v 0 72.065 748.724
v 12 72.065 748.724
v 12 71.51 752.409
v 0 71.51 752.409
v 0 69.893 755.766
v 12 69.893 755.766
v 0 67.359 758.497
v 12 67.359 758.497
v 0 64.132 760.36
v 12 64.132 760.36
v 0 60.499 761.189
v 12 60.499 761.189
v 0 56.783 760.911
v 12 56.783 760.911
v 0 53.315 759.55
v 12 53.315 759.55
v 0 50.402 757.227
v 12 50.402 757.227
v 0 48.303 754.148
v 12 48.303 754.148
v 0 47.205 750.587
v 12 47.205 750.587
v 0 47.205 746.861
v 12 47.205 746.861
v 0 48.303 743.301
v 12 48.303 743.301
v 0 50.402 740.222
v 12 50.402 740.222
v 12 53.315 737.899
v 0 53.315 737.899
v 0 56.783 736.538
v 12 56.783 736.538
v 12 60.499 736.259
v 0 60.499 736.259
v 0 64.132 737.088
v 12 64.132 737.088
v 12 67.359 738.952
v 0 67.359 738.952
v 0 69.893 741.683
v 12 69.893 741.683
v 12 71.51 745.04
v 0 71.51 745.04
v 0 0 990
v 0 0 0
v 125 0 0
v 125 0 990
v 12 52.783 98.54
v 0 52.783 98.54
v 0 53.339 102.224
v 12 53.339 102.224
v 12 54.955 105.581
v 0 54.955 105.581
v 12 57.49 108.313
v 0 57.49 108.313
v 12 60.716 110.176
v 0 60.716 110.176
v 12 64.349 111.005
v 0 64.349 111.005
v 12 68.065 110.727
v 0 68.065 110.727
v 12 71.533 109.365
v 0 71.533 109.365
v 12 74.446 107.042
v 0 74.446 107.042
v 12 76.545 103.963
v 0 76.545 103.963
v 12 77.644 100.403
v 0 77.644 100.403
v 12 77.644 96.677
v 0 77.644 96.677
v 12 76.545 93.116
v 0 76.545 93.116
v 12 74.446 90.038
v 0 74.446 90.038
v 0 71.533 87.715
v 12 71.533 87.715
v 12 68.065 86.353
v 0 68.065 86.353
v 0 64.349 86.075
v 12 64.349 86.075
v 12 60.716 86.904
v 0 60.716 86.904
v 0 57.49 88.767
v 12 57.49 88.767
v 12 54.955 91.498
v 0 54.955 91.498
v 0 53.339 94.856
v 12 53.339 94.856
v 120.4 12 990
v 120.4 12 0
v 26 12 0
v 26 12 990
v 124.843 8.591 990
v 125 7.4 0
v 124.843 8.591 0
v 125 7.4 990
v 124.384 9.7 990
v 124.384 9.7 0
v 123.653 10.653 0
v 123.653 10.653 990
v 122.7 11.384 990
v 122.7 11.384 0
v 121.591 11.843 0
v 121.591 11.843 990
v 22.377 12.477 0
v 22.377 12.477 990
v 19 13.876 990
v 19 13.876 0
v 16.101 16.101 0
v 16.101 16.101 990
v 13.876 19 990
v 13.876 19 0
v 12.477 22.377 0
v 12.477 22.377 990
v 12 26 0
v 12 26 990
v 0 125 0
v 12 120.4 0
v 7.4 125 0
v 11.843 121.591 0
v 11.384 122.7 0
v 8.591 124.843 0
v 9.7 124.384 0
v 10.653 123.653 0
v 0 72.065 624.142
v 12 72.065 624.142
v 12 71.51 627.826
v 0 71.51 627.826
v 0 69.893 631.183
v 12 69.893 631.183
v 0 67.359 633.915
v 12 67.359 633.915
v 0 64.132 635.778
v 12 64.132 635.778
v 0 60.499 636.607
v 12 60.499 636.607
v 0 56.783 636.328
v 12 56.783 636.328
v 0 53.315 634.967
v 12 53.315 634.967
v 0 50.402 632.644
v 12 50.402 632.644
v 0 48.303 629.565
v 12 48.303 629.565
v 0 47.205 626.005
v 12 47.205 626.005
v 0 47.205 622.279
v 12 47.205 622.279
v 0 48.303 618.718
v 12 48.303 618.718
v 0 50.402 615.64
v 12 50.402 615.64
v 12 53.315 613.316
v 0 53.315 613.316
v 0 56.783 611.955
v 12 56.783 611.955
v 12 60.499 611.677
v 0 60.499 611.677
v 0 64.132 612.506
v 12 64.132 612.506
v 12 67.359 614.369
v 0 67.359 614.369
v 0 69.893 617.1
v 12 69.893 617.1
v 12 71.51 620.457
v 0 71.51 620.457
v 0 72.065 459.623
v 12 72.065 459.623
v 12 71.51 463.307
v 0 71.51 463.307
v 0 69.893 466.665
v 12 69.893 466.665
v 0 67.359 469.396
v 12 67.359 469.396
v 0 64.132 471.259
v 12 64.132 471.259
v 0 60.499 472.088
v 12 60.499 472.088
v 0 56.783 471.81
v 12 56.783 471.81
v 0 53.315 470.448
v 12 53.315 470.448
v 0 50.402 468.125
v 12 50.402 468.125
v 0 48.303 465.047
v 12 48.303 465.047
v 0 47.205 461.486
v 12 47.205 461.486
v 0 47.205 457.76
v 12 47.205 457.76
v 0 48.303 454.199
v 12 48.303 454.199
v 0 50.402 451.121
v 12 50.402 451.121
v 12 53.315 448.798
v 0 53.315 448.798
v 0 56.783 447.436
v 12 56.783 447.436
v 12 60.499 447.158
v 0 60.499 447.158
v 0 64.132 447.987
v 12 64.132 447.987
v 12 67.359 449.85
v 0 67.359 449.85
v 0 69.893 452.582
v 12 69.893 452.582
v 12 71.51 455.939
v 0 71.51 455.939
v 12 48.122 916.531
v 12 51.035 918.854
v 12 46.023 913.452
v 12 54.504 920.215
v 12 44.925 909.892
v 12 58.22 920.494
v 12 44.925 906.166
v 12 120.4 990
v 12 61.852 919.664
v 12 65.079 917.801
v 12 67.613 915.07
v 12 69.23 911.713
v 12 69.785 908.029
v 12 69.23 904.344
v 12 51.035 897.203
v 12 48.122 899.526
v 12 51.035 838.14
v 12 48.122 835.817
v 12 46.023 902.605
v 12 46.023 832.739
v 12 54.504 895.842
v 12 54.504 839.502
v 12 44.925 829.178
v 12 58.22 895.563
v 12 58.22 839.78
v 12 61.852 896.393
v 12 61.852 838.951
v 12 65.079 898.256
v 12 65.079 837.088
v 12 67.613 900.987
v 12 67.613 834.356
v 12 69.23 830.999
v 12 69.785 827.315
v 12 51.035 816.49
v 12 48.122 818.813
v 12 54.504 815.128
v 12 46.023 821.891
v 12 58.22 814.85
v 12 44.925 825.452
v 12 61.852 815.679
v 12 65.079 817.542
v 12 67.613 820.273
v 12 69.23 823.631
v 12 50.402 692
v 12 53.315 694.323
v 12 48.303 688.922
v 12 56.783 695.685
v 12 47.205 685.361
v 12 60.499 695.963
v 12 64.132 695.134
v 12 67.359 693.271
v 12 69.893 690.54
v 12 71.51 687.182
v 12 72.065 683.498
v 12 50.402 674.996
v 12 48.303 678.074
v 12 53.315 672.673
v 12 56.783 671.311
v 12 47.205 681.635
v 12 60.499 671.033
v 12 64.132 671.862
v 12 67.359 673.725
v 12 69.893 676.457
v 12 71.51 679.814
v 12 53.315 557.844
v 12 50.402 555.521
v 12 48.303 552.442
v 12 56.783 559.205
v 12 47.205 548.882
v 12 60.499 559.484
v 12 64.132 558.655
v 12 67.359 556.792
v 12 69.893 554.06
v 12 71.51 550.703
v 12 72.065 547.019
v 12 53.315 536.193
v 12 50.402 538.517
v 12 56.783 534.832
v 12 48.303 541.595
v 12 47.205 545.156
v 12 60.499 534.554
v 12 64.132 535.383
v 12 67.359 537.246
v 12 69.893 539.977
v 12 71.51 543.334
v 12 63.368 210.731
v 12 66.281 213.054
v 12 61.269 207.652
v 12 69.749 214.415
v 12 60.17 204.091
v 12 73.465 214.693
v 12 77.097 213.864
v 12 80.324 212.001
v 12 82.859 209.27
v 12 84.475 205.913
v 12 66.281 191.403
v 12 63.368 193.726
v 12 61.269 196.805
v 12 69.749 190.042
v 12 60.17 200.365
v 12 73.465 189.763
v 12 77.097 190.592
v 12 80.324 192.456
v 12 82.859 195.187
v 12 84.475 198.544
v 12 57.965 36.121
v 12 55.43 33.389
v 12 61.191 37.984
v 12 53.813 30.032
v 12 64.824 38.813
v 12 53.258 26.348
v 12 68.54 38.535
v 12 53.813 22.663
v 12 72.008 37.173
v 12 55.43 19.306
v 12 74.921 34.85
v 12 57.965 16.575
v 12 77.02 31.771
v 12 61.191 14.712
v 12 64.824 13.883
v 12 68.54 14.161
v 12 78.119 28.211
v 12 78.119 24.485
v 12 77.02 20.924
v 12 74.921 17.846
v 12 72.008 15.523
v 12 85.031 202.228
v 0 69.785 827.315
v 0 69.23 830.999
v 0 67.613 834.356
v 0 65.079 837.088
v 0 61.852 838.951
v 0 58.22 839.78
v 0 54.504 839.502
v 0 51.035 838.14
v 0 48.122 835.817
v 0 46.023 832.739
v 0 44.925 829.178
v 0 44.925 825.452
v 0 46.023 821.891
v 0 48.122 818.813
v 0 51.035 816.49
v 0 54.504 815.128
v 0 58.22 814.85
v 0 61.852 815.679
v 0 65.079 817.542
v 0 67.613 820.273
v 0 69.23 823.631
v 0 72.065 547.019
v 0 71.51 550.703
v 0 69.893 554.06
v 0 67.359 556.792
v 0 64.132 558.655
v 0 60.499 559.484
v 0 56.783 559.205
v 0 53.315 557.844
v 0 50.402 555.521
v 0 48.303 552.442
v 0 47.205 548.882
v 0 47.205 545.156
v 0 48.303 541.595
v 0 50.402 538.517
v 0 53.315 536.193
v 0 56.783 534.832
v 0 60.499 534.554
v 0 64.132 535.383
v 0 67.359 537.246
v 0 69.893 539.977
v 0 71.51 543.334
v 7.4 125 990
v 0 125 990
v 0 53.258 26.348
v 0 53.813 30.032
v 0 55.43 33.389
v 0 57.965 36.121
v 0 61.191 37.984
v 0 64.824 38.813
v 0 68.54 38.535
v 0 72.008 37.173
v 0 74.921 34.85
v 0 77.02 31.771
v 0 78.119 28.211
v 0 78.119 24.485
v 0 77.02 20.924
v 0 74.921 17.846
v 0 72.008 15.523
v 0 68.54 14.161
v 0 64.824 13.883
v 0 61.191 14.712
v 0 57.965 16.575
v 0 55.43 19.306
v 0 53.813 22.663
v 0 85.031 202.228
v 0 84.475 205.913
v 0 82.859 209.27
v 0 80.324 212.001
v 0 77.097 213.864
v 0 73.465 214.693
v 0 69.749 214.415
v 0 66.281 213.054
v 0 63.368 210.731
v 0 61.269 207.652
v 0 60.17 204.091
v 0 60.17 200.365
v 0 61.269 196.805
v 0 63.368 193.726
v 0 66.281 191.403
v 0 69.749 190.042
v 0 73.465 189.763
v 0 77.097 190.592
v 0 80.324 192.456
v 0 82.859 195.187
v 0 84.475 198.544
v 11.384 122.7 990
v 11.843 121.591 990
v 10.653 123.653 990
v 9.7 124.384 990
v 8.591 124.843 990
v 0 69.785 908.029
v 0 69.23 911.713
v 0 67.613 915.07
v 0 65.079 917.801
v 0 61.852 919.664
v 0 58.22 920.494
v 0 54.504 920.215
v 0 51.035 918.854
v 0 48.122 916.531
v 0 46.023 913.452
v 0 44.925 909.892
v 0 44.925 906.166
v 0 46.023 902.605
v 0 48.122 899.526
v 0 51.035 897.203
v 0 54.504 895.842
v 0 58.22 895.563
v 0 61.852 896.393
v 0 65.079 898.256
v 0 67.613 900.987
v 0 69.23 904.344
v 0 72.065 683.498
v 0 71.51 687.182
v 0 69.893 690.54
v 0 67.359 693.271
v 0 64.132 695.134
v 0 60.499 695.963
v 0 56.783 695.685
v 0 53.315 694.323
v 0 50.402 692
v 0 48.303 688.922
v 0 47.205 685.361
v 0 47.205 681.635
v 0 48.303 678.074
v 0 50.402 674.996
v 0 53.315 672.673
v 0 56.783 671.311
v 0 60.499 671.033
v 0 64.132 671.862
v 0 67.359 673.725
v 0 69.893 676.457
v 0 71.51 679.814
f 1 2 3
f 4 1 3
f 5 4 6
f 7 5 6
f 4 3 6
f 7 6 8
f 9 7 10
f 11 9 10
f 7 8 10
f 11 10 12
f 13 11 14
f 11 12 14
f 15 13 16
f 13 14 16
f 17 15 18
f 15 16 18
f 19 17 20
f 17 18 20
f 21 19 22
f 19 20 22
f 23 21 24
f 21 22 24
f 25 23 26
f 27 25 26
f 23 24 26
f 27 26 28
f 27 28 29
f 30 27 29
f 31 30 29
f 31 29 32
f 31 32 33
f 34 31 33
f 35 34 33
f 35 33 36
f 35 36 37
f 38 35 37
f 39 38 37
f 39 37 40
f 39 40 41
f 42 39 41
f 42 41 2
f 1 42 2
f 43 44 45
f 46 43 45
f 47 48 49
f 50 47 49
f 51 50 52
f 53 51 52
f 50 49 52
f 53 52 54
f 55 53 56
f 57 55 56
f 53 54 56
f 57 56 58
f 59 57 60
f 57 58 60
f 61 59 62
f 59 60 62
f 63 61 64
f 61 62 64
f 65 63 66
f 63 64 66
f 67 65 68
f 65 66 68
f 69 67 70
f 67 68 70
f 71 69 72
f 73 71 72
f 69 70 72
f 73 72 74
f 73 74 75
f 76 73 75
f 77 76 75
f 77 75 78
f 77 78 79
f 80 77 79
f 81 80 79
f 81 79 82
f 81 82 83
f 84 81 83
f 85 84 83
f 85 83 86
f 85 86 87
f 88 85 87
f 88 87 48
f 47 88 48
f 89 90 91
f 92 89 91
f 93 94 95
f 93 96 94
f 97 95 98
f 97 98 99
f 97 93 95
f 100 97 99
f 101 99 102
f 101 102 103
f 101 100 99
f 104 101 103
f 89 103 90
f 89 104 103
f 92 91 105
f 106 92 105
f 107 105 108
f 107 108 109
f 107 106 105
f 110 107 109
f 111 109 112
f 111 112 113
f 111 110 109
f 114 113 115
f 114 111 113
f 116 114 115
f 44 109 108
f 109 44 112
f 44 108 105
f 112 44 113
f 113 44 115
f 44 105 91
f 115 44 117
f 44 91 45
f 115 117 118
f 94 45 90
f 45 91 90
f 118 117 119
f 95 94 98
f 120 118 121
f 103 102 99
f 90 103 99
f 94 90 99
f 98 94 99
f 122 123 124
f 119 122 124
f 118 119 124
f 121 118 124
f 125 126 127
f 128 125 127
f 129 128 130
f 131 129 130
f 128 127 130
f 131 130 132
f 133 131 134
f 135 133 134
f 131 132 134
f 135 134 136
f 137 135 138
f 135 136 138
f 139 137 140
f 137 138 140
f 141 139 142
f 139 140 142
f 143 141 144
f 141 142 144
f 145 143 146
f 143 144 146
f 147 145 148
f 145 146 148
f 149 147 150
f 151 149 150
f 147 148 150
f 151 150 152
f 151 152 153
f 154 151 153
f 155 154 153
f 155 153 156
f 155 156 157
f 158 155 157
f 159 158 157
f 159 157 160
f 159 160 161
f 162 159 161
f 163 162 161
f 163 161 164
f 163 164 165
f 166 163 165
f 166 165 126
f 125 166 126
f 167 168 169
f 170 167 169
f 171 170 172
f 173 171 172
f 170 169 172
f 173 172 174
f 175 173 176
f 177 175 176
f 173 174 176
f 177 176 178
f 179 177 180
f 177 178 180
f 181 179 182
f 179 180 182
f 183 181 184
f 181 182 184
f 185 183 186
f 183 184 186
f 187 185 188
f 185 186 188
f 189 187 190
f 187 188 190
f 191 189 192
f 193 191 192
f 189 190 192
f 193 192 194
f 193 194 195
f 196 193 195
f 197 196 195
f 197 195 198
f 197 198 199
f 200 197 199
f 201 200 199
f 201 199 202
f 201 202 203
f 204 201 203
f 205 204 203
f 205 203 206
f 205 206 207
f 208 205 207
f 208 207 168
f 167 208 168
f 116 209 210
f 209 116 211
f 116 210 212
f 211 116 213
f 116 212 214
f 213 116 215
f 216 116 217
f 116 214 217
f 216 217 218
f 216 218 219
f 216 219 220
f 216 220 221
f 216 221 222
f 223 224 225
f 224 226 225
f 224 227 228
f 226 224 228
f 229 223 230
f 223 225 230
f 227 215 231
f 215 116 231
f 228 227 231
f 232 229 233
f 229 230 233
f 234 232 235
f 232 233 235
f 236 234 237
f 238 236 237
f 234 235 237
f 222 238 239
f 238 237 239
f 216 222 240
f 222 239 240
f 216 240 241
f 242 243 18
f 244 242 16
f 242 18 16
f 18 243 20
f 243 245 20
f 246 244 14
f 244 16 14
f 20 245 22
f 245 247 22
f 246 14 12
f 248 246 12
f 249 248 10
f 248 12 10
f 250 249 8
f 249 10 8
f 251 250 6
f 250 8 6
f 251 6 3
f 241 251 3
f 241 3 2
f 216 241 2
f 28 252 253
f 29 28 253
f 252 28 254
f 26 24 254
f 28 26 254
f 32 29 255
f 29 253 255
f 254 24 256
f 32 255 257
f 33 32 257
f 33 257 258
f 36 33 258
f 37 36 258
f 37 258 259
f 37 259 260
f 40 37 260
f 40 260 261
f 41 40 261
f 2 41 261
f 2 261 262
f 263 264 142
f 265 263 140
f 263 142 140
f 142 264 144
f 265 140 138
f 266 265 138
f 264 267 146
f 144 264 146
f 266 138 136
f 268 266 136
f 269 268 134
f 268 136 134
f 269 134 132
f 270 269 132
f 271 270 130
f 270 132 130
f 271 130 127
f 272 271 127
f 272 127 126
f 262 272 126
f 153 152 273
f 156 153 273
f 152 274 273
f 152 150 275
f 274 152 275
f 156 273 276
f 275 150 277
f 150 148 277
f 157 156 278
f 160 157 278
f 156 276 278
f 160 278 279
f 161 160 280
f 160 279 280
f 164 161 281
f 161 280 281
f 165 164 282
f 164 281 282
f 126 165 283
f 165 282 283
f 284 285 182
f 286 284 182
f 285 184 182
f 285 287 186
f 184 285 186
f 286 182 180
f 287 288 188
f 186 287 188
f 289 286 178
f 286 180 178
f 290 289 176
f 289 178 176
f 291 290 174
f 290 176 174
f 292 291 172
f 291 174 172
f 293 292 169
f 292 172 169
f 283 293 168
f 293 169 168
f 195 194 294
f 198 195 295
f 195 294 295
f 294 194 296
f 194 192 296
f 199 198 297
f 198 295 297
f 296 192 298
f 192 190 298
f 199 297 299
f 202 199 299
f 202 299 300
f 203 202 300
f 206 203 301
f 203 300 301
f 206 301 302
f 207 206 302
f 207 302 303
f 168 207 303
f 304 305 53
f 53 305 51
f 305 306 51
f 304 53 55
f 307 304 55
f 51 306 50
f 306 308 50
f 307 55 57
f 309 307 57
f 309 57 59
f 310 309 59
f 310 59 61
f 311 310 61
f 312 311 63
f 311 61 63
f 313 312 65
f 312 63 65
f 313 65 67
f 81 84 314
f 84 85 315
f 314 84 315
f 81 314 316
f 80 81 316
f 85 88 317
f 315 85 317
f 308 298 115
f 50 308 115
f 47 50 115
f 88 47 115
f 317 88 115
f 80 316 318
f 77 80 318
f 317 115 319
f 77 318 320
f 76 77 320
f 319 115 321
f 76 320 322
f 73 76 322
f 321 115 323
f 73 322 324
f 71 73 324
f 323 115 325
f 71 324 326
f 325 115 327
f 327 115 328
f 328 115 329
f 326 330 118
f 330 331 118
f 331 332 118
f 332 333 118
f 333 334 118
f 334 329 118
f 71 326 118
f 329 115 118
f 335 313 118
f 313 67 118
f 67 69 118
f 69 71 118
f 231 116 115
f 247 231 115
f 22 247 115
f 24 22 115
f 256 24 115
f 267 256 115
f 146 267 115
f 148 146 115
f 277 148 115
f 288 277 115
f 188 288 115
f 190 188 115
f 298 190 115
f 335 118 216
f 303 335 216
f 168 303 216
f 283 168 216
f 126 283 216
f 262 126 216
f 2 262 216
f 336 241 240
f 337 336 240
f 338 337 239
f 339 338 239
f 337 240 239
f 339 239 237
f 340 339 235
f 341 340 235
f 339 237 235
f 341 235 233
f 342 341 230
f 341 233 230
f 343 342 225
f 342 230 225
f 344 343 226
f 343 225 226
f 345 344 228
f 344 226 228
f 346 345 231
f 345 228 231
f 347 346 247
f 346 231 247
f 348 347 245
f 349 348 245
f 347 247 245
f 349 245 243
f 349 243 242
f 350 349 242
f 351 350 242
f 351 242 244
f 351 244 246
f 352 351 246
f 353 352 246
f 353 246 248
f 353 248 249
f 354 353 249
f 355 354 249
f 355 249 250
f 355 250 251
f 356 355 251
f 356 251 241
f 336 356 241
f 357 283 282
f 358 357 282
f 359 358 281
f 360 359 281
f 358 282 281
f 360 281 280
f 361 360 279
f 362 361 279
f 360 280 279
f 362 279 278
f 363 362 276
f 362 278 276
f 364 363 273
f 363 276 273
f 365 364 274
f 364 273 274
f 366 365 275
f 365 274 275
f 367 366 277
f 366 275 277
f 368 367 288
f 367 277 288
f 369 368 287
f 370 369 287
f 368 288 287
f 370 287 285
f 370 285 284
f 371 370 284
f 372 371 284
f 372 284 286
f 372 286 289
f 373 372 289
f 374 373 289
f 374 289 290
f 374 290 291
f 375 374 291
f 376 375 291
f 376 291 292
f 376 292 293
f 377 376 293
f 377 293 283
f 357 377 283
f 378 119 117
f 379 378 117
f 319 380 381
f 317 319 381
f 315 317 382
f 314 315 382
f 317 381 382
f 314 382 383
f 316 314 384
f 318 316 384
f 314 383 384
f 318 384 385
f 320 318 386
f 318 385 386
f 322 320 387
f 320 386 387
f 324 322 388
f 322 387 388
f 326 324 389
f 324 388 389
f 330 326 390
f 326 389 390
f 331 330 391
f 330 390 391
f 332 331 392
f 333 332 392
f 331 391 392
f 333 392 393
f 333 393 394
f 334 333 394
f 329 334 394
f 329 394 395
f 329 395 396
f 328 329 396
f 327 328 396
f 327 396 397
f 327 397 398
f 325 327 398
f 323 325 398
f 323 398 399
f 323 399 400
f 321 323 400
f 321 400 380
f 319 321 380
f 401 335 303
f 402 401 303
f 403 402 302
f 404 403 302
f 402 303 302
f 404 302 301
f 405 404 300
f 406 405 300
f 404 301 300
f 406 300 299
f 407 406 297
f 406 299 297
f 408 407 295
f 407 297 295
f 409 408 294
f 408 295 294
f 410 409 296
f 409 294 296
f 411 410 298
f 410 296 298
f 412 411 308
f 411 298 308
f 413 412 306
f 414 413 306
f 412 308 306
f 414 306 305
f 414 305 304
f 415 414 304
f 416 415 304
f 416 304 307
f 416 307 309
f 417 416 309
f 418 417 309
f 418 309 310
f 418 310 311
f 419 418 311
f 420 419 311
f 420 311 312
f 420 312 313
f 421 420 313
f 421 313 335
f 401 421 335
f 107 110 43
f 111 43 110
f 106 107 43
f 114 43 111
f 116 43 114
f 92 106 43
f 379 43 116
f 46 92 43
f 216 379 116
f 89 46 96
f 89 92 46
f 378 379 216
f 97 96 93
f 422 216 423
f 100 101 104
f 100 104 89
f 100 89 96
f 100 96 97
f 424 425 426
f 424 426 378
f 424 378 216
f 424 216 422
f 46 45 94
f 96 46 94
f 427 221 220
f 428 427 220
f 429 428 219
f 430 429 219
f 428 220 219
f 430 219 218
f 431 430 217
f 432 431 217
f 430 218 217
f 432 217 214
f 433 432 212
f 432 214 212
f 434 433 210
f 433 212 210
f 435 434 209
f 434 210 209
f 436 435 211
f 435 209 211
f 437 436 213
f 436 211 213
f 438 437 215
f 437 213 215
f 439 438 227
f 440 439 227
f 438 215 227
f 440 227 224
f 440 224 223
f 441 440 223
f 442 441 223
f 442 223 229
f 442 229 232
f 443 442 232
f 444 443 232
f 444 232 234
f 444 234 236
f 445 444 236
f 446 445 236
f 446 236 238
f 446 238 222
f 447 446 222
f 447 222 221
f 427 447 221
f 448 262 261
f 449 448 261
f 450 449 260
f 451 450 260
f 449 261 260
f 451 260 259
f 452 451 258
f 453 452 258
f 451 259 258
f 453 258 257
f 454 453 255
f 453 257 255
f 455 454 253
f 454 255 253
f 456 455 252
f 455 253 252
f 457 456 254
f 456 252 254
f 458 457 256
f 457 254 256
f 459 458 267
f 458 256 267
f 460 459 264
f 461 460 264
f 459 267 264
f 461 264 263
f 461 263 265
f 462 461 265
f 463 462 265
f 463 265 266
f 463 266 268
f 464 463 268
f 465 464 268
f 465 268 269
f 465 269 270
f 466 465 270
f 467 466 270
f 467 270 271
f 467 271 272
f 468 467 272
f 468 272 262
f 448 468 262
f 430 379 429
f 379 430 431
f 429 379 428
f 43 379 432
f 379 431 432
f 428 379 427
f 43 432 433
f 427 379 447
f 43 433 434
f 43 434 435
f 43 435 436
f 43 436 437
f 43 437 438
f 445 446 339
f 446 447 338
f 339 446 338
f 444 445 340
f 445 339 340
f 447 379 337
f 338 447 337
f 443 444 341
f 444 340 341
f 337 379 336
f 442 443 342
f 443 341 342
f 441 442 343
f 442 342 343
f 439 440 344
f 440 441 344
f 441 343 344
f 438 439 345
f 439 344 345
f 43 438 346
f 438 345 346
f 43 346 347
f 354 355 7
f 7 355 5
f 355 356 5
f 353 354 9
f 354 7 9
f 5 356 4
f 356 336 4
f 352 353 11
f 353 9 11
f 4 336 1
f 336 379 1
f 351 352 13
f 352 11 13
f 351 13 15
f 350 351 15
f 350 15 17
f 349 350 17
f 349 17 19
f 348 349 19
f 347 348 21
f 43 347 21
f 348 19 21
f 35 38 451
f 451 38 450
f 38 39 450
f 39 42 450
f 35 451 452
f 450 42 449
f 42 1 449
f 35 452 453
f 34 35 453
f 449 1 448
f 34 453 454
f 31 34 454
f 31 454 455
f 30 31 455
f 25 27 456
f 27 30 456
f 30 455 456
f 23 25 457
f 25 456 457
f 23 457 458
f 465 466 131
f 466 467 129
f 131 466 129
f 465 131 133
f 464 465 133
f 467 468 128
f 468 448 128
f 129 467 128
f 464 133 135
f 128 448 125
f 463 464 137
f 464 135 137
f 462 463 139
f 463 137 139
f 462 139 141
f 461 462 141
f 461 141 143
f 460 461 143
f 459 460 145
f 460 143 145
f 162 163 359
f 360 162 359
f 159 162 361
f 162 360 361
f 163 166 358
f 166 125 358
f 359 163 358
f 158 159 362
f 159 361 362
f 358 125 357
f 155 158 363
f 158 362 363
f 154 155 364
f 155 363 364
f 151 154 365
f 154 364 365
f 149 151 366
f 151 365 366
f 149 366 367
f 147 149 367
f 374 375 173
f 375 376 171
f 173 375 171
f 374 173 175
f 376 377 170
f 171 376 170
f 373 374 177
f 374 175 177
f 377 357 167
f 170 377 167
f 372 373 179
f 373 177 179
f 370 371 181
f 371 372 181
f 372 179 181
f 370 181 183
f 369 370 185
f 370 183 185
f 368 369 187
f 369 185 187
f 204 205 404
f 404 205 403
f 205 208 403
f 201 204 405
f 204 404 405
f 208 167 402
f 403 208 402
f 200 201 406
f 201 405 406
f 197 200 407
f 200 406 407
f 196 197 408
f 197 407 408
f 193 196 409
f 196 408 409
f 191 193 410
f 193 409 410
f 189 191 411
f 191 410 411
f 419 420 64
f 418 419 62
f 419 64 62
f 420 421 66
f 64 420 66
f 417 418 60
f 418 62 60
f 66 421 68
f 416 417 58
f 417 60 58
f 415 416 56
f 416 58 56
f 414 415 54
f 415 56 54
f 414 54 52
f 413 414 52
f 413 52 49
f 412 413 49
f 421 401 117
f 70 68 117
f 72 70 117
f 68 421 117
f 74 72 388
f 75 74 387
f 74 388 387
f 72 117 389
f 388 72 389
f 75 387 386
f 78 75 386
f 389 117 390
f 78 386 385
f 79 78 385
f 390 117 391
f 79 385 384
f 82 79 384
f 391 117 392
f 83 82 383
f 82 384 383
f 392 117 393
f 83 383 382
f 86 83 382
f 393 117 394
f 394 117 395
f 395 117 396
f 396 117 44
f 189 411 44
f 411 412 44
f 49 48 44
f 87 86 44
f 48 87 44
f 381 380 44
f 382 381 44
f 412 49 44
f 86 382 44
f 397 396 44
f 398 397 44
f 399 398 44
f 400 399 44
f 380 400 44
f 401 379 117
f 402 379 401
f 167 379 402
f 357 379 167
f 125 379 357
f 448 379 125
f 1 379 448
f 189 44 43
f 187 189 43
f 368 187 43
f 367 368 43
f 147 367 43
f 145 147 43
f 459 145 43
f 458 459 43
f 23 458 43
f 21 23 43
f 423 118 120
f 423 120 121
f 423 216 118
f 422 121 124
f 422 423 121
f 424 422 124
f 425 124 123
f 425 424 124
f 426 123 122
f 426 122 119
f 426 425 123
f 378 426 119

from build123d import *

# Parameters (mm, degrees)
F1_DEPTH = 990
F2_R     = 4.6
F3_R     = 14
F5_D     = 25
F7_D     = 25
F9_D     = 25
F11_D    = 25


with BuildPart() as f1:
    # F0 (on Top) → F1 (new body)
    with BuildSketch(Plane.XY):
        Polygon((0, 125), (0, 0), (125, 0), (125, 12), (12, 12), (12, 125), align=None)
    extrude(amount=F1_DEPTH)

    # F2
    f2_edges = [f1.edges().sort_by_distance(p)[0] for p in [
        (12, 125, 495),
        (125, 12, 495),
    ]]
    fillet(f2_edges, radius=F2_R)

    # F3
    f3_edges = [f1.edges().sort_by_distance(p)[0] for p in [
        (12, 12, 495),
    ]]
    fillet(f3_edges, radius=F3_R)

    # F5 (through all)
    with Locations(Plane(origin=(0, 0, 0), x_dir=(0, -1, 0), z_dir=(-1, 0, 0))):
        with Locations((-57.285432, 908.028543), (-59.564956, 459.623039), (-59.564956, 547.018707), (-59.564956, 624.141753), (-59.564956, 683.498025), (-59.564956, 748.724401), (-57.285432, 827.314973)):
            Hole(F5_D / 2)

    # F7 (through all)
    with Locations(Plane(origin=(0, 0, 0), x_dir=(0, -1, 0), z_dir=(-1, 0, 0))):
        with Locations((-72.530732, 202.228412)):
            Hole(F7_D / 2)

    # F9 (through all)
    with Locations(Plane.YZ.offset(12)):
        with Locations((65.758131, 26.347905)):
            Hole(F9_D / 2)

    # F11 (through all)
    with Locations(Plane.YZ.offset(12)):
        with Locations((65.283261, 98.539941)):
            Hole(F11_D / 2)


solid = f1.part
